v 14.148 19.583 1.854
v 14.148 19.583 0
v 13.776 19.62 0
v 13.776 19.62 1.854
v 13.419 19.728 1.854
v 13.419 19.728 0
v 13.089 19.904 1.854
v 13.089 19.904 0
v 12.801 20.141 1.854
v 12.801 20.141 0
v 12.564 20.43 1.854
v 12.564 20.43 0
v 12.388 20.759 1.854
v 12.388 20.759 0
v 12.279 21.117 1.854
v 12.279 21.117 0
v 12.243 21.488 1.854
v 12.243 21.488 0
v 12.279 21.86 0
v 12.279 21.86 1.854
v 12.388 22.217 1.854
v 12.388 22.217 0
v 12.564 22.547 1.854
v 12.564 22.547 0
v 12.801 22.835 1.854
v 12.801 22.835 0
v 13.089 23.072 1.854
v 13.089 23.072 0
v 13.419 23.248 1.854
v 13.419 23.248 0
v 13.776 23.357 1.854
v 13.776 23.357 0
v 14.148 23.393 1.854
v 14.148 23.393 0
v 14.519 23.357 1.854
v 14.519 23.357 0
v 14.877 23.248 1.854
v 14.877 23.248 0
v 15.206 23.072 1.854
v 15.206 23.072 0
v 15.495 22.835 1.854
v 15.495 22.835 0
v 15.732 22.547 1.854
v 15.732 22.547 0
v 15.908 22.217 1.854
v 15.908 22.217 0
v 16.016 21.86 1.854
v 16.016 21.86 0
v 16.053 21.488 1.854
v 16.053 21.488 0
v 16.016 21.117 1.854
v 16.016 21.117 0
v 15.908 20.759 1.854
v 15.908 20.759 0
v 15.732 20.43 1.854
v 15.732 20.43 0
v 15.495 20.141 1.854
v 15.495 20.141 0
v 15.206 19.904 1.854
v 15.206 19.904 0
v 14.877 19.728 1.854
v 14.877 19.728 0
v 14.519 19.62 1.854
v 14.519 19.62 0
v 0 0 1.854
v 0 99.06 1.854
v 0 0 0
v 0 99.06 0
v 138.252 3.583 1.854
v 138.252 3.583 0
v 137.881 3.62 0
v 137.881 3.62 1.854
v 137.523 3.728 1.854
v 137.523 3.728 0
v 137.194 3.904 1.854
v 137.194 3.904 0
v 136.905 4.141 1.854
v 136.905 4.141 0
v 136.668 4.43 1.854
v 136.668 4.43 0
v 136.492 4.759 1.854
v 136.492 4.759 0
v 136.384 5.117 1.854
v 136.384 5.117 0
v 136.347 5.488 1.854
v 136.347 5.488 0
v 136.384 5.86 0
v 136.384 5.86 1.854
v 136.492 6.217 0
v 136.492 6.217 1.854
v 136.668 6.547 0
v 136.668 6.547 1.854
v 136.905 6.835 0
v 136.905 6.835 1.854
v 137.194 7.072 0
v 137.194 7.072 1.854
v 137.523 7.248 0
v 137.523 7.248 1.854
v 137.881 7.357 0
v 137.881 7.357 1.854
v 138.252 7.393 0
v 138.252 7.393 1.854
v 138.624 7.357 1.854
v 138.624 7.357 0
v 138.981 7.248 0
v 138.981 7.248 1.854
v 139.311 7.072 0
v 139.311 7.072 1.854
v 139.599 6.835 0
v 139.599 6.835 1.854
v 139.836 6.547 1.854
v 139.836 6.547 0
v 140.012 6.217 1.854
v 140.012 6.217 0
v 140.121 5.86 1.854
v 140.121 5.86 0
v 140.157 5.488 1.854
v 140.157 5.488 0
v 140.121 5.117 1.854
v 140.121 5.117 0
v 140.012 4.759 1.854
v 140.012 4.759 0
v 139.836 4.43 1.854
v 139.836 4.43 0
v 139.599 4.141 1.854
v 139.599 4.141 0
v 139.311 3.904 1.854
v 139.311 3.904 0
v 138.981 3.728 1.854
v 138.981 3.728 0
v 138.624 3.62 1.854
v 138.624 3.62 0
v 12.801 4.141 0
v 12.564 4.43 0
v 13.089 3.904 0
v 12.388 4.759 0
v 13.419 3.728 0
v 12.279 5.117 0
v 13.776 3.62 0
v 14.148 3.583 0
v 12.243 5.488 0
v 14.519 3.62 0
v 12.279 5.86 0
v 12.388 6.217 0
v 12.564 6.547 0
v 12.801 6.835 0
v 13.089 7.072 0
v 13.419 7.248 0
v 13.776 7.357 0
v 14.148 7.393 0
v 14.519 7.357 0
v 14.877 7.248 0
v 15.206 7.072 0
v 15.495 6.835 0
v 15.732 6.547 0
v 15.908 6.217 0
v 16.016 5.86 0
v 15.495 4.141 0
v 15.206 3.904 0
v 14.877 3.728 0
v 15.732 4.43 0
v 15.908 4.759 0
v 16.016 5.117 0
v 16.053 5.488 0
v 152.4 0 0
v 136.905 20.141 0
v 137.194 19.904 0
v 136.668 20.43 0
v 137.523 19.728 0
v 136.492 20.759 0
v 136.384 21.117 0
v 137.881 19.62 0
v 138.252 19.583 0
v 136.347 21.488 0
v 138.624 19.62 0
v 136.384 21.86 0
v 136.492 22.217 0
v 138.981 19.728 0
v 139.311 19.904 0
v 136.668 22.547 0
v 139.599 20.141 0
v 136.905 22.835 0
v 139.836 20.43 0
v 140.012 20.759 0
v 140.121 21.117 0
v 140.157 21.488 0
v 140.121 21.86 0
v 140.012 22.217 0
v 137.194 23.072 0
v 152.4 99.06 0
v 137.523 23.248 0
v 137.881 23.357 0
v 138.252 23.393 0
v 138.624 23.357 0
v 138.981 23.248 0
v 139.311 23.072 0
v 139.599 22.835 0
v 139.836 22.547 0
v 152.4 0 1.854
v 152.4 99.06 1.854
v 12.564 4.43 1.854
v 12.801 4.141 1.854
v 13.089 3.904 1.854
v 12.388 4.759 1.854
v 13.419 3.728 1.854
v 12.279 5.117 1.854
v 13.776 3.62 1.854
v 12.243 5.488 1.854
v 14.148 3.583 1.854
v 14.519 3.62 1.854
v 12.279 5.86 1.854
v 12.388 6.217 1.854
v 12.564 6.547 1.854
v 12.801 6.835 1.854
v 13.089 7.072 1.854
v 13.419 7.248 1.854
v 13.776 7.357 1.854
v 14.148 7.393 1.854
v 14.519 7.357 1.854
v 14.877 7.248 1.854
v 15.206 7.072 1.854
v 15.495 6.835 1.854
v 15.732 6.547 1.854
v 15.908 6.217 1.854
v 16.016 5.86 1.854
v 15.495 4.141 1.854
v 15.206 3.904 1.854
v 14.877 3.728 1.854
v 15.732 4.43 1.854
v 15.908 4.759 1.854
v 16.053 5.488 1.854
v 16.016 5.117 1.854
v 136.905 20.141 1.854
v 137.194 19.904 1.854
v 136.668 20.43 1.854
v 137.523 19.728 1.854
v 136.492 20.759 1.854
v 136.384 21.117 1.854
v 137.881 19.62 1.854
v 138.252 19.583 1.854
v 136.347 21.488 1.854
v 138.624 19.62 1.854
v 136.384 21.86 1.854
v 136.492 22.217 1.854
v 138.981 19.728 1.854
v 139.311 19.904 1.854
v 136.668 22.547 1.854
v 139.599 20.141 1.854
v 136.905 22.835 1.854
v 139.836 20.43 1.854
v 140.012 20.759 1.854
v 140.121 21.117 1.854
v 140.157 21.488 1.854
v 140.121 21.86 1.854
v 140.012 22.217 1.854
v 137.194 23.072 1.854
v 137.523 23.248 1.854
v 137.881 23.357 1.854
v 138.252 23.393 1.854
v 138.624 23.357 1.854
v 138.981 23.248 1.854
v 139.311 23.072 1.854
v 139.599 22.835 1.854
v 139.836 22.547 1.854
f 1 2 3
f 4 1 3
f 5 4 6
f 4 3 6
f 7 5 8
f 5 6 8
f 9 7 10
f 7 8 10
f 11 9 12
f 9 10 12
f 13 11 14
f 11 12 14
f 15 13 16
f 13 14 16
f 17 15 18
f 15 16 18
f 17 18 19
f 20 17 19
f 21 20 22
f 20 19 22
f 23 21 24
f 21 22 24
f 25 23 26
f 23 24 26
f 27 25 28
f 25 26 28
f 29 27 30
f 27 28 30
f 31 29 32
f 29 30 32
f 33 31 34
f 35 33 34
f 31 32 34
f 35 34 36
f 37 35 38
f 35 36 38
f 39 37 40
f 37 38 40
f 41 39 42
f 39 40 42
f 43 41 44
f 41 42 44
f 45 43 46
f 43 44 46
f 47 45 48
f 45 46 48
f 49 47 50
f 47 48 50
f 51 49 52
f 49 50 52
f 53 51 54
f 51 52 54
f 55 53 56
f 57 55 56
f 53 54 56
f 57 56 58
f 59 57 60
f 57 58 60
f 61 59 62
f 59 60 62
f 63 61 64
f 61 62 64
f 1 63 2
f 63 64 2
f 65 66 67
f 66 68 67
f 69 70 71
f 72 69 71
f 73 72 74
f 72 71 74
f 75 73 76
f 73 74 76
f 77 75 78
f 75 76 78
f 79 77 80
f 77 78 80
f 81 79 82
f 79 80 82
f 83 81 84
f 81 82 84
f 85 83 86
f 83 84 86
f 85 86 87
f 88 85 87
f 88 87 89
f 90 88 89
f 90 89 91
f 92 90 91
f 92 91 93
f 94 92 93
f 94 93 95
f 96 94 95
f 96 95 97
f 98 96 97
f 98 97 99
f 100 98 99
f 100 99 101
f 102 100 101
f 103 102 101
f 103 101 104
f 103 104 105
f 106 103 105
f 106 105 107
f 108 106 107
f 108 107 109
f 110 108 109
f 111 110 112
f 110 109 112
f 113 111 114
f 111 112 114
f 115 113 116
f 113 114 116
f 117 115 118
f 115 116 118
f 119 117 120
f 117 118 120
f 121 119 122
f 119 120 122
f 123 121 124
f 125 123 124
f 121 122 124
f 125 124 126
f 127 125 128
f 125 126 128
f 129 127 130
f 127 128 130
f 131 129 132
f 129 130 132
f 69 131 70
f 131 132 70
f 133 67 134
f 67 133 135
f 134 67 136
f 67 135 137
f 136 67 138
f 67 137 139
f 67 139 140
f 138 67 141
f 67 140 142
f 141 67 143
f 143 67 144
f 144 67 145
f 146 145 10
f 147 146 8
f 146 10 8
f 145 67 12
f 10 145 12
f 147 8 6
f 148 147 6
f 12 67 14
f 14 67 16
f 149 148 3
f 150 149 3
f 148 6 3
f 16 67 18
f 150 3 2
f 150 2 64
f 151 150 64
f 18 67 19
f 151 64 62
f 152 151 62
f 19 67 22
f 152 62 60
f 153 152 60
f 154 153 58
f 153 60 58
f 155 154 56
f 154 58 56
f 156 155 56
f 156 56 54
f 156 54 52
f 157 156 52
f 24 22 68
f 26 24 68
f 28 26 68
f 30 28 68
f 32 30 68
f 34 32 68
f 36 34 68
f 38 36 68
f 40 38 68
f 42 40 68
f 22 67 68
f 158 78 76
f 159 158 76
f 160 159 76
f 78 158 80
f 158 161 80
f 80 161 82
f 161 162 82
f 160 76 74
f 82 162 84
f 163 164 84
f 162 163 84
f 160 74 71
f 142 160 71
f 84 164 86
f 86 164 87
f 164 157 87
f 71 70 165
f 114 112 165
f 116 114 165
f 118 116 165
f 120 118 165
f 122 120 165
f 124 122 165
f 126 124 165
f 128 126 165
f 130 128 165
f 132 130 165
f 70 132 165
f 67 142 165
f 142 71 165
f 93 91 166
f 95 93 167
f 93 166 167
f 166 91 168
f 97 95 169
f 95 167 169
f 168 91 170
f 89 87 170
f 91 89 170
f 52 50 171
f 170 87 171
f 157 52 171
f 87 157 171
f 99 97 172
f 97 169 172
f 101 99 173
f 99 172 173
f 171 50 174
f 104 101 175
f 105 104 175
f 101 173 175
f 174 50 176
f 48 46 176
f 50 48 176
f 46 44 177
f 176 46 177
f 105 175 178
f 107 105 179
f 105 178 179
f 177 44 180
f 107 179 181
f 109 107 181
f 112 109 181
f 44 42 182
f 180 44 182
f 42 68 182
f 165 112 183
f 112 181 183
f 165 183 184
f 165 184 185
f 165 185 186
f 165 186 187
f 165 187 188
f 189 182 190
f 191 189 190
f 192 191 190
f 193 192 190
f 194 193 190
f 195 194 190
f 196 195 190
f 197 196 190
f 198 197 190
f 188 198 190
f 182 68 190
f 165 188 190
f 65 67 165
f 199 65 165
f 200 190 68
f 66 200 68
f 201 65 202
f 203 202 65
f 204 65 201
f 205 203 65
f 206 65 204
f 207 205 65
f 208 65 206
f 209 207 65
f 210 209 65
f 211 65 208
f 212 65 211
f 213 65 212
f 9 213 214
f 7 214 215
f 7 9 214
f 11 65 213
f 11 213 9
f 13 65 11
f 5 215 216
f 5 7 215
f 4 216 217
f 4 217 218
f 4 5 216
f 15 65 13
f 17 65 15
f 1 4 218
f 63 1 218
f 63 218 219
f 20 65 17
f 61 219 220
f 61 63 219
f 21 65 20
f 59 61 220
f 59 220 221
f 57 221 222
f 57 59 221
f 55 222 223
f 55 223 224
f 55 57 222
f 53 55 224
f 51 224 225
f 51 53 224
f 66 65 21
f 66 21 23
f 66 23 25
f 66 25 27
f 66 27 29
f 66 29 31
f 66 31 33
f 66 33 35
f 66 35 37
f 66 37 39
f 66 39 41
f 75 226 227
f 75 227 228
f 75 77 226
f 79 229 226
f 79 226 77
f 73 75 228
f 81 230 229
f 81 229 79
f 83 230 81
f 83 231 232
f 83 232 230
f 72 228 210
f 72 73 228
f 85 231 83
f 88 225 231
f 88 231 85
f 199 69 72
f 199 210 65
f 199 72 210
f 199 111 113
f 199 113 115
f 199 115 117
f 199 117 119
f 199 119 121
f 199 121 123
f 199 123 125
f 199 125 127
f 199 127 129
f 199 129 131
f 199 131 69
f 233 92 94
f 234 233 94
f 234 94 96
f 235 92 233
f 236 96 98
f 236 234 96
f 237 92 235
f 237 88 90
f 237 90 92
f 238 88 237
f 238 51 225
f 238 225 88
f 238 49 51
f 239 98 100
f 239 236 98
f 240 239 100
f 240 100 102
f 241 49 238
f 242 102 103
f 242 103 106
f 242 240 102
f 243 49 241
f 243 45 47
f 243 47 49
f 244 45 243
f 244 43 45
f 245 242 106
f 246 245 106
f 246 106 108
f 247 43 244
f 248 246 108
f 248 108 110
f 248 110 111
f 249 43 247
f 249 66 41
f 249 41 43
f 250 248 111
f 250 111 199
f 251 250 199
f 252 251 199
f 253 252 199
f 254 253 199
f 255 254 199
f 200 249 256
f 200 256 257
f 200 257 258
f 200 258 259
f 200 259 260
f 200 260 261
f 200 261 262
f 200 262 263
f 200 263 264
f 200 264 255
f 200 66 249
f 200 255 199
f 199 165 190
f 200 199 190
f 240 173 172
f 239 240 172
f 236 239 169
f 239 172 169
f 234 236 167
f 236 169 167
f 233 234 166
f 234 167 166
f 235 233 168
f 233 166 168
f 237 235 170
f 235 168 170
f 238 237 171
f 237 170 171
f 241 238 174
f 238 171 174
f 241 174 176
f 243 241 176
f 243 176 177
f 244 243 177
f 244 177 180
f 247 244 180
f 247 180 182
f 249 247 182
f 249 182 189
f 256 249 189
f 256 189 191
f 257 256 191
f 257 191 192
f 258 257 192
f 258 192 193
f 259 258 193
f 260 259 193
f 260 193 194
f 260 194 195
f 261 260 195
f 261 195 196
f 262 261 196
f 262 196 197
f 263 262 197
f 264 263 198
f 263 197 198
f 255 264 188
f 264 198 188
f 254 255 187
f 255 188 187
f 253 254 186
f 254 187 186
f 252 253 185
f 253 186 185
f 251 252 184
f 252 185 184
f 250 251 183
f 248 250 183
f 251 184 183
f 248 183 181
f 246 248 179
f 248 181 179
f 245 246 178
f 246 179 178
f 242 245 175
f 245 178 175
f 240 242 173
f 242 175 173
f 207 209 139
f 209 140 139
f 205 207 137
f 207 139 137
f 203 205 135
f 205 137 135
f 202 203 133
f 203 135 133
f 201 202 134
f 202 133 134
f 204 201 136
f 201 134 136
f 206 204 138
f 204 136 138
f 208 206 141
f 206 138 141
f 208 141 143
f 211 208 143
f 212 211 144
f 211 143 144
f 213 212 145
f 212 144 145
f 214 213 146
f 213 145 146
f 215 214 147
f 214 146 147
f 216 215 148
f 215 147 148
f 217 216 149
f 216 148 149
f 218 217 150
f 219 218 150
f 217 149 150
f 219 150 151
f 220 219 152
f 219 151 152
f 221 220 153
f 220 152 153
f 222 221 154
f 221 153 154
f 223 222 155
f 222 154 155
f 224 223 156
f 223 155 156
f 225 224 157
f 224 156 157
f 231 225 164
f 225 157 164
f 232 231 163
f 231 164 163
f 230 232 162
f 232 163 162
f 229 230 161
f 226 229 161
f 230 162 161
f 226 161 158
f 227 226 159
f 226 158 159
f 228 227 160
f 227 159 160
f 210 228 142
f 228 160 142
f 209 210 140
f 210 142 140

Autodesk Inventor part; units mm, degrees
ref_plane "YZ Plane" through (0, 0, 0) normal (1, 0, 0) x (0, 1, 0)
ref_plane "XZ Plane" through (0, 0, 0) normal (0, 1, 0) x (-1, 0, 0)
ref_plane "XY Plane" through (0, 0, 0) normal (0, 0, 1) x (1, 0, 0)
sketch "Sketch1" plane through (0, 0, 0) normal (0, 0, 1) x (1, 0, 0)
  line L0 (0, 0) -> (152.4, 0)
  line L1 (152.4, 0) -> (152.4, 99.06)
  line L2 (152.4, 99.06) -> (0, 99.06)
  line L3 (0, 99.06) -> (0, 0)
  dimension "d0" = 152.4
  dimension "d1" = 99.06
extrude "Extrusion1" add sketch "Sketch1" along normal blind 1.8542
sketch "Sketch2" plane through (0, 0, 1.8542) normal (0, 0, 1) x (1, 0, 0)
  line L0 (0, 99.06) -> (0, 0) projected
  line L1 (152.4, 99.06) -> (0, 99.06) projected
  line L2 (152.4, 0) -> (152.4, 99.06) projected
  point P0 (14.1478, 21.4884)
  point P1 (14.1478, 5.4884)
  point P2 (138.2522, 21.4884)
  point P3 (138.2522, 5.4884)
  dimension "d4" = 16
  dimension "d5" = 14.1478
  dimension "d6" = 14.1478
  dimension "d7" = 77.5716
  dimension "d8" = 16
  dimension "d9" = 14.1478
  dimension "d10" = 14.1478
  dimension "d11" = 77.5716
hole "Hole1" at (14.1478, 21.4884, 1.8542) at (14.1478, 5.4884, 1.8542) at (138.2522, 21.4884, 1.8542) at (138.2522, 5.4884, 1.8542) direction (0, 0, -1) diameter 3.81 depth 10.9728 tip angle 118
equation "\"d6\" = d5"
equation "\"d8\" = d4"
equation "\"d9\" = d5"
equation "\"d10\" = d5"
equation "\"d11\" = d7"
properties part number "PaddleCollection2.1Backing" material "Polycarbonate, Clear"
